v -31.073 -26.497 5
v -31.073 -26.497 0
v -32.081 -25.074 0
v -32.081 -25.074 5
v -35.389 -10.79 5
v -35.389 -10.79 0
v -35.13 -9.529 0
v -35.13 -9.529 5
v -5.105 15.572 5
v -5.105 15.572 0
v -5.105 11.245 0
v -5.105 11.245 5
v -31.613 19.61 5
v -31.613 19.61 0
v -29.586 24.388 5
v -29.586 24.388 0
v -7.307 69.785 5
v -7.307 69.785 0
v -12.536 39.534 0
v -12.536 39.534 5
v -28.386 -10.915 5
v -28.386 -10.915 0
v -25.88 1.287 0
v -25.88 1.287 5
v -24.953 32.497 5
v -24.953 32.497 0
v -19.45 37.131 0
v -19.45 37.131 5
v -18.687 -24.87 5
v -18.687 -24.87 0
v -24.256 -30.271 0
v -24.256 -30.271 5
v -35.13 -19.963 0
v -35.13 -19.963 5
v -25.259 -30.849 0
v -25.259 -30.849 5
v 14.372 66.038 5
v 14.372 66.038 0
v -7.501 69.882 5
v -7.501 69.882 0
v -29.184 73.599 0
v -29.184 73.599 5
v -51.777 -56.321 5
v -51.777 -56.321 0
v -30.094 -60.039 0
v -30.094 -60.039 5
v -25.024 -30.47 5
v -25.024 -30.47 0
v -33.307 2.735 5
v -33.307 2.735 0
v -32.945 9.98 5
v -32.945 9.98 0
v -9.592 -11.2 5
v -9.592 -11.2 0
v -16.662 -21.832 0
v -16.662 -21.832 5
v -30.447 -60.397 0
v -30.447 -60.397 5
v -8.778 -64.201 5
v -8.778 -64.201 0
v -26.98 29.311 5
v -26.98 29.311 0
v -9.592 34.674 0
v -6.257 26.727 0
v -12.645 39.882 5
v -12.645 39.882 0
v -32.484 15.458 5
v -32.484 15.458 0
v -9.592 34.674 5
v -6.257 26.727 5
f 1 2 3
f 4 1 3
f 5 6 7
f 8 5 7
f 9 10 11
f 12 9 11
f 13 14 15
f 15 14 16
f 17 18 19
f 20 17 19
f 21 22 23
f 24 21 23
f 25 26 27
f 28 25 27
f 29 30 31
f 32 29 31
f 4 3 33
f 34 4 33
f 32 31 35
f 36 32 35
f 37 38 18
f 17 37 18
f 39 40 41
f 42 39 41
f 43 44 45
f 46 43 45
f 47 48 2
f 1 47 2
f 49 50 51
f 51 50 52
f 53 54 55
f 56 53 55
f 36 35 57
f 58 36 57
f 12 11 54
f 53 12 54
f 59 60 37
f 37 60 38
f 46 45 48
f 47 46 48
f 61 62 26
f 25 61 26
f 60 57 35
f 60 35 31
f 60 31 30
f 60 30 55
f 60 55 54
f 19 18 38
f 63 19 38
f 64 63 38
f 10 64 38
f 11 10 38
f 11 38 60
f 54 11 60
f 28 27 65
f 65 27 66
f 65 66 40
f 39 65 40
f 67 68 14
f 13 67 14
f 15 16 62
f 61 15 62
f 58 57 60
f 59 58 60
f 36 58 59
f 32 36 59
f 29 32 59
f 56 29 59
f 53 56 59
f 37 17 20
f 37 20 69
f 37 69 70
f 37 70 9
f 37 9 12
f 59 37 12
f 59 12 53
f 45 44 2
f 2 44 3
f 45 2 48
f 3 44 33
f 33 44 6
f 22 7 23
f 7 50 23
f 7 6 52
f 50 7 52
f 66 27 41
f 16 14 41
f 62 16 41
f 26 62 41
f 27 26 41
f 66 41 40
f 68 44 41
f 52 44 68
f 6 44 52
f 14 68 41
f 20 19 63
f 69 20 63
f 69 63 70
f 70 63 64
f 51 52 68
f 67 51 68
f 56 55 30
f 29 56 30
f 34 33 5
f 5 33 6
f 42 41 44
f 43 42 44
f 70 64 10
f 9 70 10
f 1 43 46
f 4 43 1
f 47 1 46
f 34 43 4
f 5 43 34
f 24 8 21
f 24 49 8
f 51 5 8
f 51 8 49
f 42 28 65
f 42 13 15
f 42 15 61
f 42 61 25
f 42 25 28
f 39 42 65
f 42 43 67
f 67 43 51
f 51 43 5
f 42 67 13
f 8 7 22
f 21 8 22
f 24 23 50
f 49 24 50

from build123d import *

# Parameters (mm, degrees)
F2_DEPTH = 5
F4_DEPTH = 5


with BuildPart() as f2:
    # F1 (on Top) → F2 (new body)
    with BuildSketch(Plane.XY):
        Polygon((-19.450109, 37.130519), (-12.644509, 39.881718), (-7.500883, 69.881718), (-29.18448, 73.599461), (-51.777371, -56.320929), (-30.093774, -60.038672), (-25.024123, -30.470131), (-31.072693, -26.497049), (-32.080788, -25.073858), (-35.129674, -19.962974), (-35.388711, -10.790382), (-35.129674, -9.529376), (-28.38634, -10.914599), (-25.879872, 1.287019), (-33.306506, 2.73498), (-32.944723, 9.979684), (-32.483972, 15.4575), (-31.613313, 19.609716), (-29.586111, 24.388117), (-26.979711, 29.311316), (-24.952511, 32.496921), align=None)
    extrude(amount=F2_DEPTH)


with BuildPart() as f4:
    # F3 (on Top) → F4 (new body)
    with BuildSketch(Plane.XY):
        Polygon((-7.306713, 69.785409), (-12.536187, 39.534085), (-9.59153, 34.673627), (-6.256615, 26.726599), (-5.104751, 15.571803), (-5.104751, 11.24485), (-9.59153, -11.200474), (-16.661916, -21.832471), (-18.687059, -24.870184), (-24.2562, -30.270562), (-25.259029, -30.849103), (-30.447014, -60.3968), (-8.778482, -64.201362), (14.37176, 66.037903), align=None)
    extrude(amount=F4_DEPTH)


solid = Compound([f2.part, f4.part])
